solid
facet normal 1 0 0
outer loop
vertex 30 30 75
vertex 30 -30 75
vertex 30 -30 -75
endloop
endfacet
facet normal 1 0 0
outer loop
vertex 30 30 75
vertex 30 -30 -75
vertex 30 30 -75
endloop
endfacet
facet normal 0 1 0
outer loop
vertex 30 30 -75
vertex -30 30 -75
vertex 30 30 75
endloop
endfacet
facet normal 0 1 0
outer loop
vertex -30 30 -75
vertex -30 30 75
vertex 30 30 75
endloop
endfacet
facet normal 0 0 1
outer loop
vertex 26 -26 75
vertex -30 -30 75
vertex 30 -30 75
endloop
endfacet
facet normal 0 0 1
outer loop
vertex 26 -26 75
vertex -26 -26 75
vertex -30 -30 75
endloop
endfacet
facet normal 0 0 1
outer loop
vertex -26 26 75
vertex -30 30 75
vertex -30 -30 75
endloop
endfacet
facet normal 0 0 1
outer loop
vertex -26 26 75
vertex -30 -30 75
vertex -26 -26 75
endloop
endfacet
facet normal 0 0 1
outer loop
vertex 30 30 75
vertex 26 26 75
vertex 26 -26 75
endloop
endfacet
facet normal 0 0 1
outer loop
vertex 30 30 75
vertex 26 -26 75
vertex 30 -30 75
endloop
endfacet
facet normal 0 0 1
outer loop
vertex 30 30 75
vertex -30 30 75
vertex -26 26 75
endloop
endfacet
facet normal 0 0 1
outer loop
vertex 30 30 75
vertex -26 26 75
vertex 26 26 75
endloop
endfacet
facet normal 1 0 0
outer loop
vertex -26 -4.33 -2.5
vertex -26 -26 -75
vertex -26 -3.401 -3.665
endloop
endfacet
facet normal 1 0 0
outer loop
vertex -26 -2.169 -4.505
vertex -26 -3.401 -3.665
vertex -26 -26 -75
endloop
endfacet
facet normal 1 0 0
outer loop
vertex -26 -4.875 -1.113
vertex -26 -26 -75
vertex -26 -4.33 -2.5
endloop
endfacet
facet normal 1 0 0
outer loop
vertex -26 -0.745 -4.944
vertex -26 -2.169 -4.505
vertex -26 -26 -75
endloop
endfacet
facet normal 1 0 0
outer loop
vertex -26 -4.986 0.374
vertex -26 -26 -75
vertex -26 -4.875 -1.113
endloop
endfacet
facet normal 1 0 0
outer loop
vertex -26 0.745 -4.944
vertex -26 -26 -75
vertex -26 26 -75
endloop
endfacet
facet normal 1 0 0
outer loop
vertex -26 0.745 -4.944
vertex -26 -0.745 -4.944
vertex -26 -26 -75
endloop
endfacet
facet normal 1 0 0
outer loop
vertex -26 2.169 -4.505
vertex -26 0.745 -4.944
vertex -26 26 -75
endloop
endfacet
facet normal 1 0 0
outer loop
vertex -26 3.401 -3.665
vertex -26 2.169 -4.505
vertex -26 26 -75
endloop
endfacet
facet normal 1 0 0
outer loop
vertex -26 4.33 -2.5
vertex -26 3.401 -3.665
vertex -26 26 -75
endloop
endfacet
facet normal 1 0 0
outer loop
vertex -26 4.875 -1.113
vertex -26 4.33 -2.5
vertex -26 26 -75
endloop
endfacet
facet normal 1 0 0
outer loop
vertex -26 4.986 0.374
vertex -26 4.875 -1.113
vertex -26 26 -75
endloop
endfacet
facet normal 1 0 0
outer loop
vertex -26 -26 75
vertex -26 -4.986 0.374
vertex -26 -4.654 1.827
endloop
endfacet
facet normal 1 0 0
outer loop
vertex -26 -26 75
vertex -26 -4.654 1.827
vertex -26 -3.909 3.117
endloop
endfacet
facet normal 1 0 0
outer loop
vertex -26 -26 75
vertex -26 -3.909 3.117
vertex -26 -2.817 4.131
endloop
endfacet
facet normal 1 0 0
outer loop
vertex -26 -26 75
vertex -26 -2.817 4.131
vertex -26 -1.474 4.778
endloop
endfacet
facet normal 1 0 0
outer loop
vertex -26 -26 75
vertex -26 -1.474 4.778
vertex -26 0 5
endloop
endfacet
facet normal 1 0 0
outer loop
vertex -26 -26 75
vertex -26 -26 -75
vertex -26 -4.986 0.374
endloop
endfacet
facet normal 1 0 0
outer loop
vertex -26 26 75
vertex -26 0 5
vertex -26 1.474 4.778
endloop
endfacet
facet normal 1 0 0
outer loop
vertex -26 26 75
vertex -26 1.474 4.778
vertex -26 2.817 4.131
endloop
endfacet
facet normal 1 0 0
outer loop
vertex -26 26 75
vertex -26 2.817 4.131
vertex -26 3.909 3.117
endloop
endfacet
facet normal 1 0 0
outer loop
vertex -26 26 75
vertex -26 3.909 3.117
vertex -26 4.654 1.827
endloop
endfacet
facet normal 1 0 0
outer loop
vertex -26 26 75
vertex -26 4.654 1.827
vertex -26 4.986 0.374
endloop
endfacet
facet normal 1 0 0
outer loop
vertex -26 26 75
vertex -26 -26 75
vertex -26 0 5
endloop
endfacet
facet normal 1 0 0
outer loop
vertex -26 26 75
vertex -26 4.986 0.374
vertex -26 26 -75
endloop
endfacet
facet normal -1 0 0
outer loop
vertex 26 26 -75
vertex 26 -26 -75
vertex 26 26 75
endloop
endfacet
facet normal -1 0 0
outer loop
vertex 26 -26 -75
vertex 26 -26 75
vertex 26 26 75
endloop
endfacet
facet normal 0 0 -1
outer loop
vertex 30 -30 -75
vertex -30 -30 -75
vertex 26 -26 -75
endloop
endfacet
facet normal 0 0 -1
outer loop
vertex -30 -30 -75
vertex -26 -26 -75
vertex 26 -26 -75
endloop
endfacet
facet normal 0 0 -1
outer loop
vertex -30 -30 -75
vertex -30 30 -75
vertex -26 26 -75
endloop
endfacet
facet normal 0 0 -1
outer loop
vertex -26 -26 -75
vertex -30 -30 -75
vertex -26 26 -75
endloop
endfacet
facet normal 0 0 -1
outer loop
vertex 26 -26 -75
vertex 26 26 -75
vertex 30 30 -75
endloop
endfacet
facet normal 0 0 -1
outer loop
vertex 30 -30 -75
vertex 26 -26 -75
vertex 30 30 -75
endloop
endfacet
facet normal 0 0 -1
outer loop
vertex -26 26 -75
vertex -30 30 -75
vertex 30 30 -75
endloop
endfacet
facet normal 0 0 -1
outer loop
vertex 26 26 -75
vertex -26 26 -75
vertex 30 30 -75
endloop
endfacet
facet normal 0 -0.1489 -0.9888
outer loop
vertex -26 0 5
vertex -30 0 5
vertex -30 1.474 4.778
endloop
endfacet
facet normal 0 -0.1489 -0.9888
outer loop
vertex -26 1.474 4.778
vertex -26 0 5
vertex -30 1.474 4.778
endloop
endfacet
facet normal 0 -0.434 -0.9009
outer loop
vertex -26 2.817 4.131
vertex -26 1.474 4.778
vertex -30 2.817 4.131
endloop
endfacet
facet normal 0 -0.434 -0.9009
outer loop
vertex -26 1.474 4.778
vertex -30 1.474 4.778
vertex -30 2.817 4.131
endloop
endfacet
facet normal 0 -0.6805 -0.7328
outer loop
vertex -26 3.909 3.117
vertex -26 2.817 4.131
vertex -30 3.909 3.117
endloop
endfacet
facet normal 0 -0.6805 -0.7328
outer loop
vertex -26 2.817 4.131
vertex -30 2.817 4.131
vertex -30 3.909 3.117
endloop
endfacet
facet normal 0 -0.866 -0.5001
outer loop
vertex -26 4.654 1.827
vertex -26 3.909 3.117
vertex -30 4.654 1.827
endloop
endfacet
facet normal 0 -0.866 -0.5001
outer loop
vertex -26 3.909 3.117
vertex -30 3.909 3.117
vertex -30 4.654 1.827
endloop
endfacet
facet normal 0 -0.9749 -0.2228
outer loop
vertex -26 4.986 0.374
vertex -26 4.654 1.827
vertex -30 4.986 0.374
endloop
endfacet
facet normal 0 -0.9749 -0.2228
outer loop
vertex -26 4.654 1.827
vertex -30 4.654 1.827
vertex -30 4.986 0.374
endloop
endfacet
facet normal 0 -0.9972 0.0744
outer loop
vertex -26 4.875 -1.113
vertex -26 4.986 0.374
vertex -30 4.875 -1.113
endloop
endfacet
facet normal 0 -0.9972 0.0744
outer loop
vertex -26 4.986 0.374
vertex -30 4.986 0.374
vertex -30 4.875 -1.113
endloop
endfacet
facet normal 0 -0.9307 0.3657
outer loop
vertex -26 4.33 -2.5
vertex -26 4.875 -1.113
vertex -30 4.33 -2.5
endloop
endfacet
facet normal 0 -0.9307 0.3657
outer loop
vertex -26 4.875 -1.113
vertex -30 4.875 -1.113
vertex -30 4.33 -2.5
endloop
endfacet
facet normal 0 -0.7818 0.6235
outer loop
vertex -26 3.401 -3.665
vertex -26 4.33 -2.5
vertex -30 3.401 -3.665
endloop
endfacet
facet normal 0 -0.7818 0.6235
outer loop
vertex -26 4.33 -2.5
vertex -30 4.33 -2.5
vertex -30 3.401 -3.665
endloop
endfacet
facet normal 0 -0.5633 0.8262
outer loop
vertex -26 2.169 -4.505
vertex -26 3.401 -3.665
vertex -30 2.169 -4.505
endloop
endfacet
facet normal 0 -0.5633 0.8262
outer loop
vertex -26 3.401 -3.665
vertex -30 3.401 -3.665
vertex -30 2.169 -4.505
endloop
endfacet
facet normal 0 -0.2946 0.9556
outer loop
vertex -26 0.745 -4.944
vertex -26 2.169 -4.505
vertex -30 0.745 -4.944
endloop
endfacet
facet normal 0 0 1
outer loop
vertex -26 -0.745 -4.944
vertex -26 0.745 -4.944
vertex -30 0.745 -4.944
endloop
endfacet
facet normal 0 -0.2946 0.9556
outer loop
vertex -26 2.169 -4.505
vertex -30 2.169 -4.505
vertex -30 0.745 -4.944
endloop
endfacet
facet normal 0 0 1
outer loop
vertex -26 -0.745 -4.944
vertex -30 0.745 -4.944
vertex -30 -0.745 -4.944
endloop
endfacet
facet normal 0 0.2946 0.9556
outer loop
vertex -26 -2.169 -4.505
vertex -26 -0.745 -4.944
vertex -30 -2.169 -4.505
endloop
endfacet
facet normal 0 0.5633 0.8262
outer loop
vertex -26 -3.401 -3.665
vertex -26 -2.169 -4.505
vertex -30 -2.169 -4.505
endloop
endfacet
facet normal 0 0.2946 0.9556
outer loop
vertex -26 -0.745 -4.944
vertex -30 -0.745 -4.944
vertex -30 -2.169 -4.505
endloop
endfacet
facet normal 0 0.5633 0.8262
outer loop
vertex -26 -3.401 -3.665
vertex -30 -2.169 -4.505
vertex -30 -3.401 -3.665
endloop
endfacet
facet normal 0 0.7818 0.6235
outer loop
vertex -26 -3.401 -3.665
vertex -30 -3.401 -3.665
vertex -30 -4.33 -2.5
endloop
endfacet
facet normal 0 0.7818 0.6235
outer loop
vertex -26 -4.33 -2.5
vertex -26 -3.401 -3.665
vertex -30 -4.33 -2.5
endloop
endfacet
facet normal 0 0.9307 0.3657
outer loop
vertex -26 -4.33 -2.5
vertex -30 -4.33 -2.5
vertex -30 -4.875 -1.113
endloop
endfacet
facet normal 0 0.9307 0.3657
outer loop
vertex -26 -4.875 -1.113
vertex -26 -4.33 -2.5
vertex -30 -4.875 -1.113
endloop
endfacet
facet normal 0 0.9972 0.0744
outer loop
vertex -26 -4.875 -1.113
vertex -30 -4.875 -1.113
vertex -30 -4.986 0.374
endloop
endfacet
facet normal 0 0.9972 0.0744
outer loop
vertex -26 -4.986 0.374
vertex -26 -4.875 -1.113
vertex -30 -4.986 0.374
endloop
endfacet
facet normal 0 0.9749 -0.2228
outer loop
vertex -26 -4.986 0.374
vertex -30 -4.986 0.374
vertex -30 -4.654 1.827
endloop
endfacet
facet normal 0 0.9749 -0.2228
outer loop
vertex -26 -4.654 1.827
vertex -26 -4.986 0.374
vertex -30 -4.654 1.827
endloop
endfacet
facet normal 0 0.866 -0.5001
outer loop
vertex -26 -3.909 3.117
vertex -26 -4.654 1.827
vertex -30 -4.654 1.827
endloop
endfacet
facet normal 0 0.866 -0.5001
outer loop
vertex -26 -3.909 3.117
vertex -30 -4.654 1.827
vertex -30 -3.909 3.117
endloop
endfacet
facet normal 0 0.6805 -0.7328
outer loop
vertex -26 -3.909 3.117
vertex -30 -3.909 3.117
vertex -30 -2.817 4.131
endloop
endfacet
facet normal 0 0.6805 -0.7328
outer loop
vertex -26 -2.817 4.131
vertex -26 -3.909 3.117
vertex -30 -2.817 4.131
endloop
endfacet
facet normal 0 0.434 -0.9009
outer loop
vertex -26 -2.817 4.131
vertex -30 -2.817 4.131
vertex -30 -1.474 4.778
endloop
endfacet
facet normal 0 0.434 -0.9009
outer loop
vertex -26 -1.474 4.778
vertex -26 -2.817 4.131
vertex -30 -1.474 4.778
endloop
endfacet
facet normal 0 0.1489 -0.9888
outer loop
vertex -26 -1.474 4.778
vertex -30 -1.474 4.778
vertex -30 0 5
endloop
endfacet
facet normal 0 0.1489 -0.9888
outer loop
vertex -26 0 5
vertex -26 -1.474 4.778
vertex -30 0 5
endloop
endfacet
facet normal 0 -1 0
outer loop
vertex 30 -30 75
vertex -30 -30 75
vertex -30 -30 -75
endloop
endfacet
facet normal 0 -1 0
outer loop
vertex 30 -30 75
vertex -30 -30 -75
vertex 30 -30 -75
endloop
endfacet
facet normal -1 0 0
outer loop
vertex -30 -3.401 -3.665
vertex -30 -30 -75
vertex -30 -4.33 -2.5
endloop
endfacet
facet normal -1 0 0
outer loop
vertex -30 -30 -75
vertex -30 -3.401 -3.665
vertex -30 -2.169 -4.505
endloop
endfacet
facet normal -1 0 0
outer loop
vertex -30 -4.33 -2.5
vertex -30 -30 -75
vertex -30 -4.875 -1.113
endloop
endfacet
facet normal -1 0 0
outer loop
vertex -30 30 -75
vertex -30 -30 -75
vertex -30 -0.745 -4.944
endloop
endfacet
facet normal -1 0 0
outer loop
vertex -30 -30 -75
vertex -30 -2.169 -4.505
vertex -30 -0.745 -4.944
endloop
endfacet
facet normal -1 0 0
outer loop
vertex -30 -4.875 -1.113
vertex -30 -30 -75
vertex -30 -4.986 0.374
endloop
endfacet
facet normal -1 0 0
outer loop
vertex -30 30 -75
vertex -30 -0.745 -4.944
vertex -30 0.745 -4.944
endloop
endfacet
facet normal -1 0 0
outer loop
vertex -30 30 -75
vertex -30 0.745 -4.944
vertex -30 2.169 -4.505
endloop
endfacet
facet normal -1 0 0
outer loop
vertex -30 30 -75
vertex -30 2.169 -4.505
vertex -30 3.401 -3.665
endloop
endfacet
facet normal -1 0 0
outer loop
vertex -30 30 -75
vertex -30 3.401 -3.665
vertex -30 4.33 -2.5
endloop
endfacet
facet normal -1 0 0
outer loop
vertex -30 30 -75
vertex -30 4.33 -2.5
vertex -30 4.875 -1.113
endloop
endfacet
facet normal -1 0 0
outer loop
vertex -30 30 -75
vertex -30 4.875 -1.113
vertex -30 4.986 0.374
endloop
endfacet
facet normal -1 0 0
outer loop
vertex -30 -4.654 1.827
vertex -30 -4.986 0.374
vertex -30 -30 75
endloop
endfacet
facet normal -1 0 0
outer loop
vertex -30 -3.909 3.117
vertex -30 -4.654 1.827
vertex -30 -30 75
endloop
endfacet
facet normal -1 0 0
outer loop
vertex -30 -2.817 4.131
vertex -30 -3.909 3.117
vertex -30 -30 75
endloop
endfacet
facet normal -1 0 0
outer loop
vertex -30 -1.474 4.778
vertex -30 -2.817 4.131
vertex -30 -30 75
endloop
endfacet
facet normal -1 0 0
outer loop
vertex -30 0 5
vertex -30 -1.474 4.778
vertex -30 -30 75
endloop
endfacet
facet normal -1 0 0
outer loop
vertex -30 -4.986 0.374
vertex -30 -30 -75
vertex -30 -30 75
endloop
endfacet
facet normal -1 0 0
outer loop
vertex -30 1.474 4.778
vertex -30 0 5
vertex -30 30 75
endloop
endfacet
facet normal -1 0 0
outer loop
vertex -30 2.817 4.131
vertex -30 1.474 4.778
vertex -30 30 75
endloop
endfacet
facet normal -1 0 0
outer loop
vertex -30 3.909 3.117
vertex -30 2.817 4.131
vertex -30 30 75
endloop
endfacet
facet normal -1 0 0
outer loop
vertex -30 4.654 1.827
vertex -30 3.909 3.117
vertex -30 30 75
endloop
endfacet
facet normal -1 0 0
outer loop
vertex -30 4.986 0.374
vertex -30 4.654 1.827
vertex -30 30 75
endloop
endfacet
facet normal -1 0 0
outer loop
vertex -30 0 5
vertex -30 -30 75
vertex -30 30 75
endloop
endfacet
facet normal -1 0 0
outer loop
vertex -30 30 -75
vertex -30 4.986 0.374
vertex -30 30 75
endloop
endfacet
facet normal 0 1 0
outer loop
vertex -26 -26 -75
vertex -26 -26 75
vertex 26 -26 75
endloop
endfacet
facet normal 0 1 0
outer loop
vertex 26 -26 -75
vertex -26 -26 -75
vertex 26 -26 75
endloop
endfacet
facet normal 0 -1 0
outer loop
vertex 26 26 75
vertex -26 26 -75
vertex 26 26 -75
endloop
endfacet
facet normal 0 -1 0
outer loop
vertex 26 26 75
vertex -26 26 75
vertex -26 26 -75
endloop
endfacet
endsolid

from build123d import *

# Parameters (mm, degrees)
SZKIC1_W                    = 60
SZKIC1_H                    = 60
SZKIC1_W_2                  = 52
SZKIC1_H_2                  = 52
DODANIE_WYCI_GNI_CIE1_DEPTH = 75
SZKIC28_R                   = 5
WYTNIJ_WYCI_GNI_CIE1_DEPTH  = 25


with BuildPart() as part:
    # Szkic1 → Dodanie-wyciągnięcie1 (new body, symmetric)
    with BuildSketch(Plane.XY):
        Rectangle(SZKIC1_W, SZKIC1_H)
        Rectangle(SZKIC1_W_2, SZKIC1_H_2, mode=Mode.SUBTRACT)
    extrude(amount=DODANIE_WYCI_GNI_CIE1_DEPTH, both=True)

    # Szkic28 → Wytnij-wyciągnięcie1 (cut)
    with BuildSketch(Plane.ZY.offset(30)):
        Circle(SZKIC28_R)
    extrude(amount=-WYTNIJ_WYCI_GNI_CIE1_DEPTH, mode=Mode.SUBTRACT)


solid = part.part
